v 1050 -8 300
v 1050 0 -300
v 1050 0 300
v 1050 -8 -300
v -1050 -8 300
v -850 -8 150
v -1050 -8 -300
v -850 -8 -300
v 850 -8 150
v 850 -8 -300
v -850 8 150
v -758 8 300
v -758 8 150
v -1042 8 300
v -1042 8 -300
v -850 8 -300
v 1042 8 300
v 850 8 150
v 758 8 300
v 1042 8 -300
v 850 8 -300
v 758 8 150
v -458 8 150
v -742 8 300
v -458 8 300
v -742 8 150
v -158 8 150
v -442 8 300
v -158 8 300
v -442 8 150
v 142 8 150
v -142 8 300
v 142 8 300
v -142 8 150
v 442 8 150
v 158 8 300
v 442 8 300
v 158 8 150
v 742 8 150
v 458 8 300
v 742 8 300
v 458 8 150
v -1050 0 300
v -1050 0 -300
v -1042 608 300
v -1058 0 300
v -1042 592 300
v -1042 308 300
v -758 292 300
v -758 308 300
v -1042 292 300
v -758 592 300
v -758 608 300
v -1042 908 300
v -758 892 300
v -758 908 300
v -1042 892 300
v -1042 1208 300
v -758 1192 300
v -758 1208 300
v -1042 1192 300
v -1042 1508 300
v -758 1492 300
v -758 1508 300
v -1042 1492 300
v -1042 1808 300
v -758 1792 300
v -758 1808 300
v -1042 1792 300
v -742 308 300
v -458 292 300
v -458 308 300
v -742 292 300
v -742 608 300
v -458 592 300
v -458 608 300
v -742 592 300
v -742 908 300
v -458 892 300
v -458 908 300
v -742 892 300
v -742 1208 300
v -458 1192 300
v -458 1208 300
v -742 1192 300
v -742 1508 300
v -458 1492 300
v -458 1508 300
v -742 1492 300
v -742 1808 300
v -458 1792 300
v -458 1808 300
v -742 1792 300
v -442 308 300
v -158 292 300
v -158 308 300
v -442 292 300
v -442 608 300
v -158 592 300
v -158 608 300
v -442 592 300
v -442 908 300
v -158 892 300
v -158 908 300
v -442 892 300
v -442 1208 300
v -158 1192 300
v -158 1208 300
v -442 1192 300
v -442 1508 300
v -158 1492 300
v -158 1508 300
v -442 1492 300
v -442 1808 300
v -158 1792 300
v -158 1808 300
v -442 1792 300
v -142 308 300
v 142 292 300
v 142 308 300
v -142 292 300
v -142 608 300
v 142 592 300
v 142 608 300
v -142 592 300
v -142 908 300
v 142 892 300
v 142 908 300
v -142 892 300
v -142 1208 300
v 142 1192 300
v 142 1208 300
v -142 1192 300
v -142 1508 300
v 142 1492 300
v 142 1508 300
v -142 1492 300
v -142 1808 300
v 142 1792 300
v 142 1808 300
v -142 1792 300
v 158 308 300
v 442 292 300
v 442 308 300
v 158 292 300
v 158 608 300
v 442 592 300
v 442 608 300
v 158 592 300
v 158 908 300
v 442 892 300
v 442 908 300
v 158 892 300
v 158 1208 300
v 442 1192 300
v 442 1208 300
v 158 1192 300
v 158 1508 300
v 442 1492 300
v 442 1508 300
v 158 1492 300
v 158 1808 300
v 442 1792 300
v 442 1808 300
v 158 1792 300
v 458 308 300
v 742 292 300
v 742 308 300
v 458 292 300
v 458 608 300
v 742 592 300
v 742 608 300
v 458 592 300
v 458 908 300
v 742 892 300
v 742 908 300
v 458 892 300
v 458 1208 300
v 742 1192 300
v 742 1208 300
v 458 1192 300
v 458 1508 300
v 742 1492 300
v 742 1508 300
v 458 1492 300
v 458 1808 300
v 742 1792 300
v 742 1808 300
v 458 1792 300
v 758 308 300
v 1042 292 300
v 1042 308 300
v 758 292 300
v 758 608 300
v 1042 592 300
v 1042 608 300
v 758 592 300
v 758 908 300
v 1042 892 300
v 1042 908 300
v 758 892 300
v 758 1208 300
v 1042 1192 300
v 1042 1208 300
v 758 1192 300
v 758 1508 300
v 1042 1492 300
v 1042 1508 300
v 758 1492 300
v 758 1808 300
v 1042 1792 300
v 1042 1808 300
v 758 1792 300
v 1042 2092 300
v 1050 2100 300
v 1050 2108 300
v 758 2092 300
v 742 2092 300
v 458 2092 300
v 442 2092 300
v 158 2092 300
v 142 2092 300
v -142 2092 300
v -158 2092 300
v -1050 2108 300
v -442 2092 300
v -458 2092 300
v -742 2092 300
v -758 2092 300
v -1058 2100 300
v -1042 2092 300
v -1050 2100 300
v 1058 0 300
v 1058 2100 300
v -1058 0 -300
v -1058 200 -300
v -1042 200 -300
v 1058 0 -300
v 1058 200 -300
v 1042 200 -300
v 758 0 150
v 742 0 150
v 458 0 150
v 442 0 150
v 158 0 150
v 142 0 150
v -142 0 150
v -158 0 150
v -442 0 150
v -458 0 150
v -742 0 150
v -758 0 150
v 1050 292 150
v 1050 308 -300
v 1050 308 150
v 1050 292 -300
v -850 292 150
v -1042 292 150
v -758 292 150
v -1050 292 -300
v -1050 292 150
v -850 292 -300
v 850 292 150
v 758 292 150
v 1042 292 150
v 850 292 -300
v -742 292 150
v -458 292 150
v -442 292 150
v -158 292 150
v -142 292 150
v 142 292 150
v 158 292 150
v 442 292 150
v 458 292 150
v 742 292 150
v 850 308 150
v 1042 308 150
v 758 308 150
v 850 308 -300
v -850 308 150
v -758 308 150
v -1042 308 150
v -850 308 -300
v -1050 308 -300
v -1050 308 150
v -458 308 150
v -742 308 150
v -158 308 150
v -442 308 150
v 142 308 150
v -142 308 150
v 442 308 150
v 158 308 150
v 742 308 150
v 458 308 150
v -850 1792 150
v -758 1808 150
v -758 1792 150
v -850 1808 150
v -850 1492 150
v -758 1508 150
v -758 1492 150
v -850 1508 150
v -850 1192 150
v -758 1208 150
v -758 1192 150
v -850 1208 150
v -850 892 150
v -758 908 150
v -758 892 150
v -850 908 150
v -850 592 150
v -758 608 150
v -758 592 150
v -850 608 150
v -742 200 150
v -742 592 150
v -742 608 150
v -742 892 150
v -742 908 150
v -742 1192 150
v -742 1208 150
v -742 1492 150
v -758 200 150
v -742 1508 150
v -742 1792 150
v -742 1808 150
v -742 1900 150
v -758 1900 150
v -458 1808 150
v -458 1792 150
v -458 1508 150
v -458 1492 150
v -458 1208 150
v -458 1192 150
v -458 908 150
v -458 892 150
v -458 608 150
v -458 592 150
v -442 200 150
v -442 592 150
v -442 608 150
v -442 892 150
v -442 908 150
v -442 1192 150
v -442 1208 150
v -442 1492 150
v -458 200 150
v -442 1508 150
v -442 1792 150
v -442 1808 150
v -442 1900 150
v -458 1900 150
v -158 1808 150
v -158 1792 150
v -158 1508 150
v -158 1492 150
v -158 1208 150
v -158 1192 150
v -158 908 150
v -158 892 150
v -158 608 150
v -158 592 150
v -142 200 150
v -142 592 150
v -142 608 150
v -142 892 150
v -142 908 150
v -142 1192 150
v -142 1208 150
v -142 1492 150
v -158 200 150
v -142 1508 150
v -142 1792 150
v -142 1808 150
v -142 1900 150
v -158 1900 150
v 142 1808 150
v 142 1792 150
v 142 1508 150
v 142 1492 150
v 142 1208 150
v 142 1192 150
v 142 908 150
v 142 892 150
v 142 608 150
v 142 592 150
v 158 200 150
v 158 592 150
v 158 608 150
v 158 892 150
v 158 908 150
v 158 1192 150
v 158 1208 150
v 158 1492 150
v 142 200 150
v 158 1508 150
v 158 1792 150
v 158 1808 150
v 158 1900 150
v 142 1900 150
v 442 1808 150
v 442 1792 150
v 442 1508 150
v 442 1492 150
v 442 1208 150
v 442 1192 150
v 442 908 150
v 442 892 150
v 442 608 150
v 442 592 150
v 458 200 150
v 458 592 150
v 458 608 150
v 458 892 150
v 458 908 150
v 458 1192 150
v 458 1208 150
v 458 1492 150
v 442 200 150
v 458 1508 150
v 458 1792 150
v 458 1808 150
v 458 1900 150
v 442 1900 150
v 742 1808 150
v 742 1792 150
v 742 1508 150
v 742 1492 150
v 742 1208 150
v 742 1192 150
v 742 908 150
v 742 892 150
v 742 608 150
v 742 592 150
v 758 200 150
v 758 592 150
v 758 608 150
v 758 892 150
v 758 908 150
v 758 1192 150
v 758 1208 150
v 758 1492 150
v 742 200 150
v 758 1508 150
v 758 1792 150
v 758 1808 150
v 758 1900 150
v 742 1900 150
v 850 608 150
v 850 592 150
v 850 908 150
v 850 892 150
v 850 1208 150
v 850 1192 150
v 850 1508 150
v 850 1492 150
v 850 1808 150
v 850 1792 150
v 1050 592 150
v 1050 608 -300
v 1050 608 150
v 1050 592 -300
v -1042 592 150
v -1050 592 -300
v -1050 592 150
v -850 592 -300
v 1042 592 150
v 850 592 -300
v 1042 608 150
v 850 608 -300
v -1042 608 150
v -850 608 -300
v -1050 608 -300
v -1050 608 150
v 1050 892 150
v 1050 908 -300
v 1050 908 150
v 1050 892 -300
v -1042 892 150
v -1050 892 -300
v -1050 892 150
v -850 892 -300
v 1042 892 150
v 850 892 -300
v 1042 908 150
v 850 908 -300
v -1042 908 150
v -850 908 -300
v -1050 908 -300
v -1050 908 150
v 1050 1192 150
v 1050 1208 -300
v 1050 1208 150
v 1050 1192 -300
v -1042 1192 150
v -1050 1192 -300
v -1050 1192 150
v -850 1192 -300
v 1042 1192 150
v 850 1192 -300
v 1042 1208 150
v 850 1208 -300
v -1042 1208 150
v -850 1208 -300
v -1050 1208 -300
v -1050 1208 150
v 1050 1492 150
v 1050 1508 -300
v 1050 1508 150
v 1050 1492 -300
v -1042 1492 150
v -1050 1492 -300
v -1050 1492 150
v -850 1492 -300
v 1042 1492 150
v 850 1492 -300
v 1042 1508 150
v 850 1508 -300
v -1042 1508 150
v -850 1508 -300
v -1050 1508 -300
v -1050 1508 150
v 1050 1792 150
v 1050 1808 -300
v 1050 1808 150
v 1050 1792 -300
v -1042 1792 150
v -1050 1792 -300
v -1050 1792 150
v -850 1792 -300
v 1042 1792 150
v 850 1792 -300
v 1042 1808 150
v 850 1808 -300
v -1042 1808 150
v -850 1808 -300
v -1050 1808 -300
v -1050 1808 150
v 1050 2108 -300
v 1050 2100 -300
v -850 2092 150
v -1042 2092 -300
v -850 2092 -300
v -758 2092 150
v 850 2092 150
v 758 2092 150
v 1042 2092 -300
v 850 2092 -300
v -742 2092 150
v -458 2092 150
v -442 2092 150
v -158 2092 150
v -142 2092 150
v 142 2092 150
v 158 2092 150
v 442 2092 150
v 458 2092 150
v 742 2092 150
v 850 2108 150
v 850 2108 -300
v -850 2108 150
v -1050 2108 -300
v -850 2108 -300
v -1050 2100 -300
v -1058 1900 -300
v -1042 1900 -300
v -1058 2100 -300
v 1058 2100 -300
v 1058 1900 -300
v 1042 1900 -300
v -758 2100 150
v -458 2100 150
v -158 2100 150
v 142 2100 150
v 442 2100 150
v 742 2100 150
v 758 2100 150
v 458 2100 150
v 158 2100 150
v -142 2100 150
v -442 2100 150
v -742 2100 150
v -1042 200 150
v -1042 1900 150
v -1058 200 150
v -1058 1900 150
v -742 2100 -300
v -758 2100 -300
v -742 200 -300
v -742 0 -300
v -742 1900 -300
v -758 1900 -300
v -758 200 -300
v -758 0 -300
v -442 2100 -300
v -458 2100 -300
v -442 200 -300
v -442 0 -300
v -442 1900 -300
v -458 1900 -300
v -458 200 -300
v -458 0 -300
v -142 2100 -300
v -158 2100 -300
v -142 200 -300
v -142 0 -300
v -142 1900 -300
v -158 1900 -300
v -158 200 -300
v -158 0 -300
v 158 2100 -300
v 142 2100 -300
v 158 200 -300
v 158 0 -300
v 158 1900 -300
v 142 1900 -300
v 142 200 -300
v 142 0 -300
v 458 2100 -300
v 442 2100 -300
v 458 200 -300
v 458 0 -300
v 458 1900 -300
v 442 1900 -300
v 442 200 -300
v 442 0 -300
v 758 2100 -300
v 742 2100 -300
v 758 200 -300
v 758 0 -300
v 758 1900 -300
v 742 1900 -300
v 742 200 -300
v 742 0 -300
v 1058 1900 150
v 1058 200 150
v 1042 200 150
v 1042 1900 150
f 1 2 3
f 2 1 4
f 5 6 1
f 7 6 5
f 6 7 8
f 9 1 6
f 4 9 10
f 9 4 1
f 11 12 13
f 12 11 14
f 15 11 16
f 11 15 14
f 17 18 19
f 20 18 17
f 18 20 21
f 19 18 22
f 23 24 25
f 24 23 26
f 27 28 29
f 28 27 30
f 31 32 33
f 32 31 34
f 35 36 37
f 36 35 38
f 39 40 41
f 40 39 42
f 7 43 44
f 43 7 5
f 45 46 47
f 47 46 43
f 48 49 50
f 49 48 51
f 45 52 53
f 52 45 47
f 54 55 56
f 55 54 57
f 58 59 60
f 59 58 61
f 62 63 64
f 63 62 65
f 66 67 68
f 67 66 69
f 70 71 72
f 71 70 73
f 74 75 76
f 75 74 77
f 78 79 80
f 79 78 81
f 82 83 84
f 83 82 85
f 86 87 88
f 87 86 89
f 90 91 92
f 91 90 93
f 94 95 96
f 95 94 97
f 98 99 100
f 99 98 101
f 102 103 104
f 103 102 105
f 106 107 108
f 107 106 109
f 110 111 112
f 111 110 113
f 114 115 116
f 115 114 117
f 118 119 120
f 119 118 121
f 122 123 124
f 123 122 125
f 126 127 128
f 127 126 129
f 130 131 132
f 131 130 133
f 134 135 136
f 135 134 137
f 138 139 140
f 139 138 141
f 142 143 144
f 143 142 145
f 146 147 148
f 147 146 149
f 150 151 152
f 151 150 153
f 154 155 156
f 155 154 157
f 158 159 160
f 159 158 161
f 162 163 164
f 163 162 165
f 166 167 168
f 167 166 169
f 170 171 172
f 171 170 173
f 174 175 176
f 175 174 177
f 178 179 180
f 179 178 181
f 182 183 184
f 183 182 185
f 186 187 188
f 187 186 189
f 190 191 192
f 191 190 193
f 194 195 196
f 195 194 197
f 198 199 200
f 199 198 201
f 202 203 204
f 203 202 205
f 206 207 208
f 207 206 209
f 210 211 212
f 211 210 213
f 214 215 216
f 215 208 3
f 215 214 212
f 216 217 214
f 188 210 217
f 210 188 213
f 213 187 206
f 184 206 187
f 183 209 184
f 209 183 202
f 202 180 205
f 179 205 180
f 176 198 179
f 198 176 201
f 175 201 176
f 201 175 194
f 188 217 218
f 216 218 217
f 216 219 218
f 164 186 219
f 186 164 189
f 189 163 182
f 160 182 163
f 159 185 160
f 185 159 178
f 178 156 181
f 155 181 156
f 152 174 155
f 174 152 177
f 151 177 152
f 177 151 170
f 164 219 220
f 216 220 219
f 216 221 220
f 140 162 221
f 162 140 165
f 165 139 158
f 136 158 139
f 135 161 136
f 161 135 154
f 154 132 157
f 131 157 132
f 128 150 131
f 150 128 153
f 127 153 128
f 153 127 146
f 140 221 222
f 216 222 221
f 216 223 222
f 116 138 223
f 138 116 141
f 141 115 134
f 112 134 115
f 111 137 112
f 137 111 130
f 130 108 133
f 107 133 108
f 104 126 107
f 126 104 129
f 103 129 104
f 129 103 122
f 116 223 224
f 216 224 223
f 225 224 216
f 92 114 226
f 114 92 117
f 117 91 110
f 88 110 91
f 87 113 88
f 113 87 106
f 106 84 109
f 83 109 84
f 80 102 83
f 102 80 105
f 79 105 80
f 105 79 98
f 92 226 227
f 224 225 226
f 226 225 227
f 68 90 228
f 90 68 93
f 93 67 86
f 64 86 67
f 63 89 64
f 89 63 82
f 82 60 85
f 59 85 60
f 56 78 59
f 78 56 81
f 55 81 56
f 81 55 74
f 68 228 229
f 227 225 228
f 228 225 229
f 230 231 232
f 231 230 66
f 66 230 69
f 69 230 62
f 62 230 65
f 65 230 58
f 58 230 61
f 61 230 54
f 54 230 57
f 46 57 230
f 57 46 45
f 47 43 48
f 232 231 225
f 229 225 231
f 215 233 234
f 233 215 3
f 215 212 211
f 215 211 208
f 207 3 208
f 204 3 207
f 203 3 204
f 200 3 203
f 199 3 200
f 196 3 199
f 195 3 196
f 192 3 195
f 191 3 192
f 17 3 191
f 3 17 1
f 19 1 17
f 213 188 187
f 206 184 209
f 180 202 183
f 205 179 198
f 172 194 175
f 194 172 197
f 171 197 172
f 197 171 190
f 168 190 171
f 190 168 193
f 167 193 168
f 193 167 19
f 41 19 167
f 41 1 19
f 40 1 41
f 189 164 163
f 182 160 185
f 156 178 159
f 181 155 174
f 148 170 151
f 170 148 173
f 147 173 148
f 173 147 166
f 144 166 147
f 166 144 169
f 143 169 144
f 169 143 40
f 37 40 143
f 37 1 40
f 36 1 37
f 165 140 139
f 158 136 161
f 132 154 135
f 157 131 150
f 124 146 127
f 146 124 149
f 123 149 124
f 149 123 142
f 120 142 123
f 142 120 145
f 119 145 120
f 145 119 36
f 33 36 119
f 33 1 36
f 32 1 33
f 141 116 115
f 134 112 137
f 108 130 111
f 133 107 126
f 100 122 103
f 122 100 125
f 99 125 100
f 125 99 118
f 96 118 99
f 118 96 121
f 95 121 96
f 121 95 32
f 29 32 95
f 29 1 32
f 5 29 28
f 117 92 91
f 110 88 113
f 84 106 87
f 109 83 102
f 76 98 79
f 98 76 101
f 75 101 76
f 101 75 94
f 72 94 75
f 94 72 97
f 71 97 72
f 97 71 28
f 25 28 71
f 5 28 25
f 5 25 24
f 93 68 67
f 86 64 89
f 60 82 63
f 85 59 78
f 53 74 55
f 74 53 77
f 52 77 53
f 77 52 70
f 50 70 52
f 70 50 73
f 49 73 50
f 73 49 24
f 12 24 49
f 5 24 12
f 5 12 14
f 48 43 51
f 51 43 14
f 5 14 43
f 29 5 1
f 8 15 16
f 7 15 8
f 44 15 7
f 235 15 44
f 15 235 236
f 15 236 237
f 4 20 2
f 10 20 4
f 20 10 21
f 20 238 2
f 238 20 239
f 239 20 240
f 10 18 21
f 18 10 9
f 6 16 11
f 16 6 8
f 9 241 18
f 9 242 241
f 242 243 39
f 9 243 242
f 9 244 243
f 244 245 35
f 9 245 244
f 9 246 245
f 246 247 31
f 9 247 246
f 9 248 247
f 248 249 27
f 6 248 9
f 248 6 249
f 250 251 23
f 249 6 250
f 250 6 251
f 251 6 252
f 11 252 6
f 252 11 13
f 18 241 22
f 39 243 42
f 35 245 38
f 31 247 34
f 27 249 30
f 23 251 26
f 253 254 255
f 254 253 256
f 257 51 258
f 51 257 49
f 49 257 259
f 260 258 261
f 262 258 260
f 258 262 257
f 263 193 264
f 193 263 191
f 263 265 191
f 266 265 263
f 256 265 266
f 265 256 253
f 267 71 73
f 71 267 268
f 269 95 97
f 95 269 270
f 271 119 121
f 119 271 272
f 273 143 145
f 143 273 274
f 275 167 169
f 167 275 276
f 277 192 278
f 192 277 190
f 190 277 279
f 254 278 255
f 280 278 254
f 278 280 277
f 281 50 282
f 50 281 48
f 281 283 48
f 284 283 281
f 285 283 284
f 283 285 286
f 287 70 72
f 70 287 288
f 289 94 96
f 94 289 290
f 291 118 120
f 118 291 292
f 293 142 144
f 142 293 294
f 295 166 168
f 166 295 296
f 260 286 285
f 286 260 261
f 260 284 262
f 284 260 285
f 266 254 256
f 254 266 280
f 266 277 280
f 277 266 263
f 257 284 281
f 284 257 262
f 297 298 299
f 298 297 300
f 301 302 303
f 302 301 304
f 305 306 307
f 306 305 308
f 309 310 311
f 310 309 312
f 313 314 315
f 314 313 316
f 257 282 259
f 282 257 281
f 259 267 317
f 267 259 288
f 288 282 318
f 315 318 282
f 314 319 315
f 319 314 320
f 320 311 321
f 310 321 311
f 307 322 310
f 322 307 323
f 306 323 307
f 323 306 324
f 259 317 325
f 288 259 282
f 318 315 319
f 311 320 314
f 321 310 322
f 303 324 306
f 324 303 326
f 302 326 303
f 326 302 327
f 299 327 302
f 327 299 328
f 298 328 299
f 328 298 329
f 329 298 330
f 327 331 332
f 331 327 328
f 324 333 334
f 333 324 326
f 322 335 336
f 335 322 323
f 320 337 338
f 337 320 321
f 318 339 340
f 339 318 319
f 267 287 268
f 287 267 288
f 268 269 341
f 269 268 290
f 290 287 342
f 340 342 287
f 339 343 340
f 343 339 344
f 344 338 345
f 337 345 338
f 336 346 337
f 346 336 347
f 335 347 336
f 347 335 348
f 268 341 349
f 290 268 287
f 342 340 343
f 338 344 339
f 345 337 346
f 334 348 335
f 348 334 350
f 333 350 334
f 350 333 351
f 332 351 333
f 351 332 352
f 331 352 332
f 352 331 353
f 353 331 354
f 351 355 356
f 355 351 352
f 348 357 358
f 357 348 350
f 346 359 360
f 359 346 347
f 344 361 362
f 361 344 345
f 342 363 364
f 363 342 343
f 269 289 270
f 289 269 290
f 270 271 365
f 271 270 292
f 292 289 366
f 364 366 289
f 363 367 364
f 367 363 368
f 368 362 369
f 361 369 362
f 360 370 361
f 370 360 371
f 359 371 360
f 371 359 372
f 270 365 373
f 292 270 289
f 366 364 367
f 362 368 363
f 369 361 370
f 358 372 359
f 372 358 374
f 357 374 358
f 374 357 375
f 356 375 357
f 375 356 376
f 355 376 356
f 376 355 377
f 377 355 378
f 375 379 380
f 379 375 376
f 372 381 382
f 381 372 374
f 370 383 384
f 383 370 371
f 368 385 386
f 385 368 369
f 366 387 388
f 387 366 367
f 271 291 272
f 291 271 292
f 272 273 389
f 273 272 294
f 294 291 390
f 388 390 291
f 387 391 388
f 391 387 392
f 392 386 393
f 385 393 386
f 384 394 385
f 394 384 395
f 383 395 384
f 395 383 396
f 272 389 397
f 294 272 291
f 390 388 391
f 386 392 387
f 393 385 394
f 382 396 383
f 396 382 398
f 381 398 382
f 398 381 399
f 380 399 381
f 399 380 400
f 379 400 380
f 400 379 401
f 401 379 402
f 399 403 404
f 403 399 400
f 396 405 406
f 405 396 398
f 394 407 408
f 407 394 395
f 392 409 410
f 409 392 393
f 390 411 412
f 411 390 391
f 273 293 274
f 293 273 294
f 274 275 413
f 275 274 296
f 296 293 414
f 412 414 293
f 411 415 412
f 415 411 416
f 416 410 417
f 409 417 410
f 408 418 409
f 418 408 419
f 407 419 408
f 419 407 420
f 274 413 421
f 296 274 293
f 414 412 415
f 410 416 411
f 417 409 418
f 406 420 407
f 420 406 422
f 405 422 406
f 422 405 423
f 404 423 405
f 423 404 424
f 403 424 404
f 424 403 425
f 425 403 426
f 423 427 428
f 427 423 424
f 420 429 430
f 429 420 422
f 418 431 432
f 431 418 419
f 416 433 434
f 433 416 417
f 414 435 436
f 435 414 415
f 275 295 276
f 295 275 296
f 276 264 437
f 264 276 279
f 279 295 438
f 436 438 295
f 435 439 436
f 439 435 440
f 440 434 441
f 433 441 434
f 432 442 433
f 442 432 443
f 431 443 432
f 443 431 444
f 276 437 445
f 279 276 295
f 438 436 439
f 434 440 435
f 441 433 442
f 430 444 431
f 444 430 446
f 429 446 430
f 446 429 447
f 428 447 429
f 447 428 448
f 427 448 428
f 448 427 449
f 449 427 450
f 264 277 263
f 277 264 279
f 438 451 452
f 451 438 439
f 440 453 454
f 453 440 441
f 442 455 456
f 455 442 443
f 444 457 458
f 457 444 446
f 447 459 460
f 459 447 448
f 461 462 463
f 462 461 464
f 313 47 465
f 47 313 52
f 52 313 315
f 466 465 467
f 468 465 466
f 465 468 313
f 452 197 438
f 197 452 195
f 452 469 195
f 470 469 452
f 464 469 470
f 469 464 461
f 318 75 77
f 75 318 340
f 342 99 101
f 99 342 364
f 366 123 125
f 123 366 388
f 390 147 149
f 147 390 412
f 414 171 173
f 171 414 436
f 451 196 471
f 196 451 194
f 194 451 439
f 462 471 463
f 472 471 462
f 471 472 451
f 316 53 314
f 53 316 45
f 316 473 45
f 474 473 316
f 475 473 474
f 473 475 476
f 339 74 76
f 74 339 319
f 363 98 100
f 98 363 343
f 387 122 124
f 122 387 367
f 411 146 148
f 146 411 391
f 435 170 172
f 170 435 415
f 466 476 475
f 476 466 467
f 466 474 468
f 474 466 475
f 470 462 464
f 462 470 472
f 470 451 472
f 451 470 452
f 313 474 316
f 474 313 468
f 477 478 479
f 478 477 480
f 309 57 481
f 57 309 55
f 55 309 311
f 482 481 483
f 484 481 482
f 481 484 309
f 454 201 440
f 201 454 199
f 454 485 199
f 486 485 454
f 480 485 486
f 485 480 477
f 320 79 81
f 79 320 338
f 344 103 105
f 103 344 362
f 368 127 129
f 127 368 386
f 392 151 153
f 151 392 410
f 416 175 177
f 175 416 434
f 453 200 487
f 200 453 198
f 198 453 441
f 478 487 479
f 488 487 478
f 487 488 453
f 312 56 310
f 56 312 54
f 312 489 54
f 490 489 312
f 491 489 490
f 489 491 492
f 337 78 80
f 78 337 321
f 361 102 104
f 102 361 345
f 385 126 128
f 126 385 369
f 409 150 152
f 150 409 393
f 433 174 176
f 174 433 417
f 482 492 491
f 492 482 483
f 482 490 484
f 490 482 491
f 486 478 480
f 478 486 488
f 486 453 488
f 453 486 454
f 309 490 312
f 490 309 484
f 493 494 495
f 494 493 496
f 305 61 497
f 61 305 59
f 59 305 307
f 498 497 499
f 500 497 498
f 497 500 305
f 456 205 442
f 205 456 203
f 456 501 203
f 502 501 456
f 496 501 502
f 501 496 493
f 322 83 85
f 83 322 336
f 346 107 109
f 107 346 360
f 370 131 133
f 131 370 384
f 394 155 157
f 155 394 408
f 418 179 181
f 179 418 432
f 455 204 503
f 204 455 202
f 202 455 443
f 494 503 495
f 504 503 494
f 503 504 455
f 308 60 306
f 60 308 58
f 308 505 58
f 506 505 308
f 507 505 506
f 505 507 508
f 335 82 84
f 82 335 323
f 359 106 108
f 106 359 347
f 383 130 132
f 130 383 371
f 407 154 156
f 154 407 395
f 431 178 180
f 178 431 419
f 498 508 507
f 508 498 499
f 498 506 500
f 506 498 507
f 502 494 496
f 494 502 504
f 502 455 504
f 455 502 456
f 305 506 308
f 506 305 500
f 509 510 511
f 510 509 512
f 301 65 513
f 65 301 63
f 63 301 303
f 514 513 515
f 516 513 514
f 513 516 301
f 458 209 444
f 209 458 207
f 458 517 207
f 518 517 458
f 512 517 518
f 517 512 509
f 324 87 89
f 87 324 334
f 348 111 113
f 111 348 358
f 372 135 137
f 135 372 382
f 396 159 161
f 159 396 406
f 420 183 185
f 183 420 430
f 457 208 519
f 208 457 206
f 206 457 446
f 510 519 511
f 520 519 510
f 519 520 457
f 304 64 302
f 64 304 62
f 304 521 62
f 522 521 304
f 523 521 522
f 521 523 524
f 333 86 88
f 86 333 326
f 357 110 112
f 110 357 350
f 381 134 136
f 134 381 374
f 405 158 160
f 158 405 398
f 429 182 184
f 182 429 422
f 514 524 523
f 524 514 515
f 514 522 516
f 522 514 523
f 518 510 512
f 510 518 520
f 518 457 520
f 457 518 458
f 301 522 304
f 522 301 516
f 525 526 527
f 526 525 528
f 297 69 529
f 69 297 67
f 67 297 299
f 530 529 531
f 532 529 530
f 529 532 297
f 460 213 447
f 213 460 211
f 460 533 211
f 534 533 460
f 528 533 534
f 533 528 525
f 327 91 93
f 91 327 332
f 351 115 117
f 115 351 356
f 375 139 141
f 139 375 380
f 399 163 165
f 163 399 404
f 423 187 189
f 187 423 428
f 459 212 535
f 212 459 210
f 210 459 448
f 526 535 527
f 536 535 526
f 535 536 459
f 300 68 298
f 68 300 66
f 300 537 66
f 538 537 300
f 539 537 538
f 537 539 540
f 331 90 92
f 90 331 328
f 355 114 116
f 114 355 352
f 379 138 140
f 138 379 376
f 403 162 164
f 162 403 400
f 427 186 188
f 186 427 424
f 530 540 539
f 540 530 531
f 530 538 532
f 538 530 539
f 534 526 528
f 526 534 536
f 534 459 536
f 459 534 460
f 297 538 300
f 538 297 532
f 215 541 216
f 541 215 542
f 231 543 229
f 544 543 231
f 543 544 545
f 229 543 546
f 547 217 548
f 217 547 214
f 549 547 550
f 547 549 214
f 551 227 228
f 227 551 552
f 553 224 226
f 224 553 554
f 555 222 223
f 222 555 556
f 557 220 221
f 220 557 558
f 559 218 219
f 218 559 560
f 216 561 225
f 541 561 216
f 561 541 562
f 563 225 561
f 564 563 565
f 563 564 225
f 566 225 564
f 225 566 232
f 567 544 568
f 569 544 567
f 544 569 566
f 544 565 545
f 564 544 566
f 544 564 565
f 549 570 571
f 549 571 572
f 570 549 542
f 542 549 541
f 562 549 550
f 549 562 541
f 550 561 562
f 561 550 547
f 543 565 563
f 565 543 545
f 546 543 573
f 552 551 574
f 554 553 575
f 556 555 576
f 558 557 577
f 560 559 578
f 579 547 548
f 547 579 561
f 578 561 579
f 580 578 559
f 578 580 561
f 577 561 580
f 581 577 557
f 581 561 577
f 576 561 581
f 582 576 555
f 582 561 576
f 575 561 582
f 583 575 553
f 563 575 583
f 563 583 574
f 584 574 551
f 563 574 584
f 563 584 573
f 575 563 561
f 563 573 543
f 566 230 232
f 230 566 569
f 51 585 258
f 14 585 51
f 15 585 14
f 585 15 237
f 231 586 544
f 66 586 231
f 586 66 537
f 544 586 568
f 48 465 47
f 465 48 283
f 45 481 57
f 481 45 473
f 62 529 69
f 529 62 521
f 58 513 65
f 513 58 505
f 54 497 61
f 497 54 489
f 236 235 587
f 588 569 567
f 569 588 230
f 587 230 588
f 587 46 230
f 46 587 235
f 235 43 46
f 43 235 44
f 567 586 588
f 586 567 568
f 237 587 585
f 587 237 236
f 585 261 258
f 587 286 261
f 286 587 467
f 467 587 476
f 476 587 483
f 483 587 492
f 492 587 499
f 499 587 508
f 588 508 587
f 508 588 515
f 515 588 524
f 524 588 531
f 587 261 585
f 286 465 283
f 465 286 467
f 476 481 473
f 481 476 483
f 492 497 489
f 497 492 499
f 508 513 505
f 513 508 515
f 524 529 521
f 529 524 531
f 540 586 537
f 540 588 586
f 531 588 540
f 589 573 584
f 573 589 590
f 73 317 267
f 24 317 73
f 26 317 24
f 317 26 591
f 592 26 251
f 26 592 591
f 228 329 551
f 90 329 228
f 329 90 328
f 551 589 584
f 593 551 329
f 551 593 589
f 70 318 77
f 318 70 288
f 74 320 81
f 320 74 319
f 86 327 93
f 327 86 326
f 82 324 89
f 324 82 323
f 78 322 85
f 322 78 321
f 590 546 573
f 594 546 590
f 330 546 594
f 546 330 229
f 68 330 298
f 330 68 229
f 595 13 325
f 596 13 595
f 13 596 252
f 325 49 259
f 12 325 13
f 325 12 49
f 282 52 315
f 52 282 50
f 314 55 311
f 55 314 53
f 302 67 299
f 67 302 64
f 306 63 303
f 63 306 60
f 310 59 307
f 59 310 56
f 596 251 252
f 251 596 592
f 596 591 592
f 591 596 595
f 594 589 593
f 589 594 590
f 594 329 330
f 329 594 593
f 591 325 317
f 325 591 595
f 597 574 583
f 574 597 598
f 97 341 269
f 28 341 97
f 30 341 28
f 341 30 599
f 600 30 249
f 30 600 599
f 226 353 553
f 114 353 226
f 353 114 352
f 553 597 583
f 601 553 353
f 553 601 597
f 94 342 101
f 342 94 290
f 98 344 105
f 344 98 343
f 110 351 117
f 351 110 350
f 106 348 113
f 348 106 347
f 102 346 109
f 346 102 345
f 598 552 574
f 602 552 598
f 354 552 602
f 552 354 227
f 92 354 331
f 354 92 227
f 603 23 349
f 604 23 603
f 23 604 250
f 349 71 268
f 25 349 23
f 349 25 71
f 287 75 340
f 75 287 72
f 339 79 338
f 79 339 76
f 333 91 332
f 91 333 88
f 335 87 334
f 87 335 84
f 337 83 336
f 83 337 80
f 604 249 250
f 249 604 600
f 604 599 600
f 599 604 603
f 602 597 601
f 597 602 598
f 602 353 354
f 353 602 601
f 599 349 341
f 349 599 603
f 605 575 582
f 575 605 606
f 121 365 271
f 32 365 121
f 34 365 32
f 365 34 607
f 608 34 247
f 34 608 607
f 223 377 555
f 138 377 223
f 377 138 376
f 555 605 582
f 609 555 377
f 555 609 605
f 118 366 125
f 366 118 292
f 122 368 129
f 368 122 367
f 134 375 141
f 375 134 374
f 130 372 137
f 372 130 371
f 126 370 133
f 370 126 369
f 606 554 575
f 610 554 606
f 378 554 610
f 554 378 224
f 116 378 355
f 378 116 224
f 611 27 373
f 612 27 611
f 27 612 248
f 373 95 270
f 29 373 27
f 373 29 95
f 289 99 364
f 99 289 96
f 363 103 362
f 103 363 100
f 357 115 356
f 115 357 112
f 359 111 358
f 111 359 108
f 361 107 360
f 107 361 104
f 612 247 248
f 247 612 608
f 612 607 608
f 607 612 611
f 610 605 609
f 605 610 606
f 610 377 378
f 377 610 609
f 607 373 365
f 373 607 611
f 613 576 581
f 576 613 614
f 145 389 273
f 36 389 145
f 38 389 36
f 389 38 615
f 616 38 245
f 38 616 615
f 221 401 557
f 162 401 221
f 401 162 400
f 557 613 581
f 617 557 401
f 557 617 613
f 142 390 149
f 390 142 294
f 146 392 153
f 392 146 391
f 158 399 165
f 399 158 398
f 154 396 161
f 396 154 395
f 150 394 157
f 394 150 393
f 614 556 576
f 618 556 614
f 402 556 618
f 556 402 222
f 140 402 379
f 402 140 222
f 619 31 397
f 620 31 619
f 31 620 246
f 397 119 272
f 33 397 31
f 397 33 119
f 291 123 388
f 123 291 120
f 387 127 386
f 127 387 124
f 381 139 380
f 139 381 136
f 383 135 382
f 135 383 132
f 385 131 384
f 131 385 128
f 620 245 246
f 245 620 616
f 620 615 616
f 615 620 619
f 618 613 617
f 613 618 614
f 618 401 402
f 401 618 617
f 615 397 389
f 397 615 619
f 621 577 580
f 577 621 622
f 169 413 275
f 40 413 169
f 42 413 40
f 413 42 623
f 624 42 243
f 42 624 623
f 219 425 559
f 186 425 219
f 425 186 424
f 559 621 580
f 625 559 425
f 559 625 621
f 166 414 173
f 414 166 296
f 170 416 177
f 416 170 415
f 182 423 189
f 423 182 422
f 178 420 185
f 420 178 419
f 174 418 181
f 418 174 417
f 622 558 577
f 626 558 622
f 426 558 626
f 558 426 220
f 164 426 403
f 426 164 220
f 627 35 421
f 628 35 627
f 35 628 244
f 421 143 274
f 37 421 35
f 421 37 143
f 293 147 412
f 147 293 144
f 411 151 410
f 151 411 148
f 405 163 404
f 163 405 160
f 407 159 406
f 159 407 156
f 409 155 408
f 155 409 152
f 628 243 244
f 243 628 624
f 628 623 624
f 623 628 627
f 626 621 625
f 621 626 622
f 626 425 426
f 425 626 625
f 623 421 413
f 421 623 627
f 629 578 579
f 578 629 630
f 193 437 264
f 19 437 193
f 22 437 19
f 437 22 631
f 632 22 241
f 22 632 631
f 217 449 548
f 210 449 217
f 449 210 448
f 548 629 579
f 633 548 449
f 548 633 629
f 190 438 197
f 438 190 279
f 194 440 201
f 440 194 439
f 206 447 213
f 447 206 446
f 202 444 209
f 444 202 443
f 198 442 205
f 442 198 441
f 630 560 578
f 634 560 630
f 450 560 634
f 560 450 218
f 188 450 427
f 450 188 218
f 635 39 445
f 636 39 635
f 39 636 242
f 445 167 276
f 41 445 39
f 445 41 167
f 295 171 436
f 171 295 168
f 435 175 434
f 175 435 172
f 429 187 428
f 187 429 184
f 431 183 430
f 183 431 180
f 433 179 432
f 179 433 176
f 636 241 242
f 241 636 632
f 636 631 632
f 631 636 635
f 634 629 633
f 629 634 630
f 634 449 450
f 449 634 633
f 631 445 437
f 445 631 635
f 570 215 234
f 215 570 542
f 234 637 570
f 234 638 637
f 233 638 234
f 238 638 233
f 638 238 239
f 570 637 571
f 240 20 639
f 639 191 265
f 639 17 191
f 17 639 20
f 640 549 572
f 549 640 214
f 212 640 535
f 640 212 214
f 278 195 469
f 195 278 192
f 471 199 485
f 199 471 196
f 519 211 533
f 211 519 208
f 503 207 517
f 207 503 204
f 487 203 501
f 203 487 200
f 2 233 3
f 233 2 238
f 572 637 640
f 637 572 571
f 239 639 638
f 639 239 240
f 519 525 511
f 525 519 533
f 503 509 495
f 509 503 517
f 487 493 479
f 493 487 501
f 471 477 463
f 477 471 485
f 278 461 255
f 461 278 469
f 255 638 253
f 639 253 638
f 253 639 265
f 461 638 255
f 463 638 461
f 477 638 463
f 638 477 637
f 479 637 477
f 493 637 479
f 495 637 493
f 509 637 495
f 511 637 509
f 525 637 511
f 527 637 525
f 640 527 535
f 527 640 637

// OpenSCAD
thickness =16;
height = 600;
width =1800;
length =2100;
leg_width = 200;
beam_depth =100;
margin =5;
cell_spacing = 300;


//cell([0,i*cell_spacing,0],[90,0,0], length,height);


// short side
num_short_parts = floor(length/cell_spacing);
echo(num_short_parts);
for(i=[0:1:num_short_parts]){
    cell([0,i*cell_spacing,0],[90,0,0], length,height);
}

// long side
num_long_parts = floor(width/cell_spacing)+1;
num_long_parts_each = num_long_parts/2;
echo(num_long_parts);
for(i=[-num_long_parts_each:1:num_long_parts_each]){
    
    if((num_long_parts/2))
    cell([i*cell_spacing,length/2,0],[90,0,90], length,height);
}

//cell([0,0,0],[0,0,0], length,height);

 module cell(translation, rotation, length, width) {
   translate(translation)
       rotate(rotation)
            difference(){
                cube([length, width,thickness],true);
                translate([0,-beam_depth,0]) 
                cube([length-2*leg_width, width-beam_depth,thickness+margin],true);
                
            }
   }    
/*
//function even(x) = if(x%2!=1) {true; false;};

x = 30;   
val=undef;
if (x%2==1) {val=true; val=false;}
echo(val);
   
//echo(even(30));
   
       
  
// echor(even(3));   
   // tail-recursion elimination example: add all integers up to n
function add_up_to(n, sum=0) =
    n==0 ?
        sum :
        add_up_to(n-1, sum+n);

echo(sum=add_up_to(100000));
// ECHO: sum = 5.00005e+009


function even(n, val=undef) = if (n%2==0) {val =true; val = false};

echo(val=even(100000));

*/
